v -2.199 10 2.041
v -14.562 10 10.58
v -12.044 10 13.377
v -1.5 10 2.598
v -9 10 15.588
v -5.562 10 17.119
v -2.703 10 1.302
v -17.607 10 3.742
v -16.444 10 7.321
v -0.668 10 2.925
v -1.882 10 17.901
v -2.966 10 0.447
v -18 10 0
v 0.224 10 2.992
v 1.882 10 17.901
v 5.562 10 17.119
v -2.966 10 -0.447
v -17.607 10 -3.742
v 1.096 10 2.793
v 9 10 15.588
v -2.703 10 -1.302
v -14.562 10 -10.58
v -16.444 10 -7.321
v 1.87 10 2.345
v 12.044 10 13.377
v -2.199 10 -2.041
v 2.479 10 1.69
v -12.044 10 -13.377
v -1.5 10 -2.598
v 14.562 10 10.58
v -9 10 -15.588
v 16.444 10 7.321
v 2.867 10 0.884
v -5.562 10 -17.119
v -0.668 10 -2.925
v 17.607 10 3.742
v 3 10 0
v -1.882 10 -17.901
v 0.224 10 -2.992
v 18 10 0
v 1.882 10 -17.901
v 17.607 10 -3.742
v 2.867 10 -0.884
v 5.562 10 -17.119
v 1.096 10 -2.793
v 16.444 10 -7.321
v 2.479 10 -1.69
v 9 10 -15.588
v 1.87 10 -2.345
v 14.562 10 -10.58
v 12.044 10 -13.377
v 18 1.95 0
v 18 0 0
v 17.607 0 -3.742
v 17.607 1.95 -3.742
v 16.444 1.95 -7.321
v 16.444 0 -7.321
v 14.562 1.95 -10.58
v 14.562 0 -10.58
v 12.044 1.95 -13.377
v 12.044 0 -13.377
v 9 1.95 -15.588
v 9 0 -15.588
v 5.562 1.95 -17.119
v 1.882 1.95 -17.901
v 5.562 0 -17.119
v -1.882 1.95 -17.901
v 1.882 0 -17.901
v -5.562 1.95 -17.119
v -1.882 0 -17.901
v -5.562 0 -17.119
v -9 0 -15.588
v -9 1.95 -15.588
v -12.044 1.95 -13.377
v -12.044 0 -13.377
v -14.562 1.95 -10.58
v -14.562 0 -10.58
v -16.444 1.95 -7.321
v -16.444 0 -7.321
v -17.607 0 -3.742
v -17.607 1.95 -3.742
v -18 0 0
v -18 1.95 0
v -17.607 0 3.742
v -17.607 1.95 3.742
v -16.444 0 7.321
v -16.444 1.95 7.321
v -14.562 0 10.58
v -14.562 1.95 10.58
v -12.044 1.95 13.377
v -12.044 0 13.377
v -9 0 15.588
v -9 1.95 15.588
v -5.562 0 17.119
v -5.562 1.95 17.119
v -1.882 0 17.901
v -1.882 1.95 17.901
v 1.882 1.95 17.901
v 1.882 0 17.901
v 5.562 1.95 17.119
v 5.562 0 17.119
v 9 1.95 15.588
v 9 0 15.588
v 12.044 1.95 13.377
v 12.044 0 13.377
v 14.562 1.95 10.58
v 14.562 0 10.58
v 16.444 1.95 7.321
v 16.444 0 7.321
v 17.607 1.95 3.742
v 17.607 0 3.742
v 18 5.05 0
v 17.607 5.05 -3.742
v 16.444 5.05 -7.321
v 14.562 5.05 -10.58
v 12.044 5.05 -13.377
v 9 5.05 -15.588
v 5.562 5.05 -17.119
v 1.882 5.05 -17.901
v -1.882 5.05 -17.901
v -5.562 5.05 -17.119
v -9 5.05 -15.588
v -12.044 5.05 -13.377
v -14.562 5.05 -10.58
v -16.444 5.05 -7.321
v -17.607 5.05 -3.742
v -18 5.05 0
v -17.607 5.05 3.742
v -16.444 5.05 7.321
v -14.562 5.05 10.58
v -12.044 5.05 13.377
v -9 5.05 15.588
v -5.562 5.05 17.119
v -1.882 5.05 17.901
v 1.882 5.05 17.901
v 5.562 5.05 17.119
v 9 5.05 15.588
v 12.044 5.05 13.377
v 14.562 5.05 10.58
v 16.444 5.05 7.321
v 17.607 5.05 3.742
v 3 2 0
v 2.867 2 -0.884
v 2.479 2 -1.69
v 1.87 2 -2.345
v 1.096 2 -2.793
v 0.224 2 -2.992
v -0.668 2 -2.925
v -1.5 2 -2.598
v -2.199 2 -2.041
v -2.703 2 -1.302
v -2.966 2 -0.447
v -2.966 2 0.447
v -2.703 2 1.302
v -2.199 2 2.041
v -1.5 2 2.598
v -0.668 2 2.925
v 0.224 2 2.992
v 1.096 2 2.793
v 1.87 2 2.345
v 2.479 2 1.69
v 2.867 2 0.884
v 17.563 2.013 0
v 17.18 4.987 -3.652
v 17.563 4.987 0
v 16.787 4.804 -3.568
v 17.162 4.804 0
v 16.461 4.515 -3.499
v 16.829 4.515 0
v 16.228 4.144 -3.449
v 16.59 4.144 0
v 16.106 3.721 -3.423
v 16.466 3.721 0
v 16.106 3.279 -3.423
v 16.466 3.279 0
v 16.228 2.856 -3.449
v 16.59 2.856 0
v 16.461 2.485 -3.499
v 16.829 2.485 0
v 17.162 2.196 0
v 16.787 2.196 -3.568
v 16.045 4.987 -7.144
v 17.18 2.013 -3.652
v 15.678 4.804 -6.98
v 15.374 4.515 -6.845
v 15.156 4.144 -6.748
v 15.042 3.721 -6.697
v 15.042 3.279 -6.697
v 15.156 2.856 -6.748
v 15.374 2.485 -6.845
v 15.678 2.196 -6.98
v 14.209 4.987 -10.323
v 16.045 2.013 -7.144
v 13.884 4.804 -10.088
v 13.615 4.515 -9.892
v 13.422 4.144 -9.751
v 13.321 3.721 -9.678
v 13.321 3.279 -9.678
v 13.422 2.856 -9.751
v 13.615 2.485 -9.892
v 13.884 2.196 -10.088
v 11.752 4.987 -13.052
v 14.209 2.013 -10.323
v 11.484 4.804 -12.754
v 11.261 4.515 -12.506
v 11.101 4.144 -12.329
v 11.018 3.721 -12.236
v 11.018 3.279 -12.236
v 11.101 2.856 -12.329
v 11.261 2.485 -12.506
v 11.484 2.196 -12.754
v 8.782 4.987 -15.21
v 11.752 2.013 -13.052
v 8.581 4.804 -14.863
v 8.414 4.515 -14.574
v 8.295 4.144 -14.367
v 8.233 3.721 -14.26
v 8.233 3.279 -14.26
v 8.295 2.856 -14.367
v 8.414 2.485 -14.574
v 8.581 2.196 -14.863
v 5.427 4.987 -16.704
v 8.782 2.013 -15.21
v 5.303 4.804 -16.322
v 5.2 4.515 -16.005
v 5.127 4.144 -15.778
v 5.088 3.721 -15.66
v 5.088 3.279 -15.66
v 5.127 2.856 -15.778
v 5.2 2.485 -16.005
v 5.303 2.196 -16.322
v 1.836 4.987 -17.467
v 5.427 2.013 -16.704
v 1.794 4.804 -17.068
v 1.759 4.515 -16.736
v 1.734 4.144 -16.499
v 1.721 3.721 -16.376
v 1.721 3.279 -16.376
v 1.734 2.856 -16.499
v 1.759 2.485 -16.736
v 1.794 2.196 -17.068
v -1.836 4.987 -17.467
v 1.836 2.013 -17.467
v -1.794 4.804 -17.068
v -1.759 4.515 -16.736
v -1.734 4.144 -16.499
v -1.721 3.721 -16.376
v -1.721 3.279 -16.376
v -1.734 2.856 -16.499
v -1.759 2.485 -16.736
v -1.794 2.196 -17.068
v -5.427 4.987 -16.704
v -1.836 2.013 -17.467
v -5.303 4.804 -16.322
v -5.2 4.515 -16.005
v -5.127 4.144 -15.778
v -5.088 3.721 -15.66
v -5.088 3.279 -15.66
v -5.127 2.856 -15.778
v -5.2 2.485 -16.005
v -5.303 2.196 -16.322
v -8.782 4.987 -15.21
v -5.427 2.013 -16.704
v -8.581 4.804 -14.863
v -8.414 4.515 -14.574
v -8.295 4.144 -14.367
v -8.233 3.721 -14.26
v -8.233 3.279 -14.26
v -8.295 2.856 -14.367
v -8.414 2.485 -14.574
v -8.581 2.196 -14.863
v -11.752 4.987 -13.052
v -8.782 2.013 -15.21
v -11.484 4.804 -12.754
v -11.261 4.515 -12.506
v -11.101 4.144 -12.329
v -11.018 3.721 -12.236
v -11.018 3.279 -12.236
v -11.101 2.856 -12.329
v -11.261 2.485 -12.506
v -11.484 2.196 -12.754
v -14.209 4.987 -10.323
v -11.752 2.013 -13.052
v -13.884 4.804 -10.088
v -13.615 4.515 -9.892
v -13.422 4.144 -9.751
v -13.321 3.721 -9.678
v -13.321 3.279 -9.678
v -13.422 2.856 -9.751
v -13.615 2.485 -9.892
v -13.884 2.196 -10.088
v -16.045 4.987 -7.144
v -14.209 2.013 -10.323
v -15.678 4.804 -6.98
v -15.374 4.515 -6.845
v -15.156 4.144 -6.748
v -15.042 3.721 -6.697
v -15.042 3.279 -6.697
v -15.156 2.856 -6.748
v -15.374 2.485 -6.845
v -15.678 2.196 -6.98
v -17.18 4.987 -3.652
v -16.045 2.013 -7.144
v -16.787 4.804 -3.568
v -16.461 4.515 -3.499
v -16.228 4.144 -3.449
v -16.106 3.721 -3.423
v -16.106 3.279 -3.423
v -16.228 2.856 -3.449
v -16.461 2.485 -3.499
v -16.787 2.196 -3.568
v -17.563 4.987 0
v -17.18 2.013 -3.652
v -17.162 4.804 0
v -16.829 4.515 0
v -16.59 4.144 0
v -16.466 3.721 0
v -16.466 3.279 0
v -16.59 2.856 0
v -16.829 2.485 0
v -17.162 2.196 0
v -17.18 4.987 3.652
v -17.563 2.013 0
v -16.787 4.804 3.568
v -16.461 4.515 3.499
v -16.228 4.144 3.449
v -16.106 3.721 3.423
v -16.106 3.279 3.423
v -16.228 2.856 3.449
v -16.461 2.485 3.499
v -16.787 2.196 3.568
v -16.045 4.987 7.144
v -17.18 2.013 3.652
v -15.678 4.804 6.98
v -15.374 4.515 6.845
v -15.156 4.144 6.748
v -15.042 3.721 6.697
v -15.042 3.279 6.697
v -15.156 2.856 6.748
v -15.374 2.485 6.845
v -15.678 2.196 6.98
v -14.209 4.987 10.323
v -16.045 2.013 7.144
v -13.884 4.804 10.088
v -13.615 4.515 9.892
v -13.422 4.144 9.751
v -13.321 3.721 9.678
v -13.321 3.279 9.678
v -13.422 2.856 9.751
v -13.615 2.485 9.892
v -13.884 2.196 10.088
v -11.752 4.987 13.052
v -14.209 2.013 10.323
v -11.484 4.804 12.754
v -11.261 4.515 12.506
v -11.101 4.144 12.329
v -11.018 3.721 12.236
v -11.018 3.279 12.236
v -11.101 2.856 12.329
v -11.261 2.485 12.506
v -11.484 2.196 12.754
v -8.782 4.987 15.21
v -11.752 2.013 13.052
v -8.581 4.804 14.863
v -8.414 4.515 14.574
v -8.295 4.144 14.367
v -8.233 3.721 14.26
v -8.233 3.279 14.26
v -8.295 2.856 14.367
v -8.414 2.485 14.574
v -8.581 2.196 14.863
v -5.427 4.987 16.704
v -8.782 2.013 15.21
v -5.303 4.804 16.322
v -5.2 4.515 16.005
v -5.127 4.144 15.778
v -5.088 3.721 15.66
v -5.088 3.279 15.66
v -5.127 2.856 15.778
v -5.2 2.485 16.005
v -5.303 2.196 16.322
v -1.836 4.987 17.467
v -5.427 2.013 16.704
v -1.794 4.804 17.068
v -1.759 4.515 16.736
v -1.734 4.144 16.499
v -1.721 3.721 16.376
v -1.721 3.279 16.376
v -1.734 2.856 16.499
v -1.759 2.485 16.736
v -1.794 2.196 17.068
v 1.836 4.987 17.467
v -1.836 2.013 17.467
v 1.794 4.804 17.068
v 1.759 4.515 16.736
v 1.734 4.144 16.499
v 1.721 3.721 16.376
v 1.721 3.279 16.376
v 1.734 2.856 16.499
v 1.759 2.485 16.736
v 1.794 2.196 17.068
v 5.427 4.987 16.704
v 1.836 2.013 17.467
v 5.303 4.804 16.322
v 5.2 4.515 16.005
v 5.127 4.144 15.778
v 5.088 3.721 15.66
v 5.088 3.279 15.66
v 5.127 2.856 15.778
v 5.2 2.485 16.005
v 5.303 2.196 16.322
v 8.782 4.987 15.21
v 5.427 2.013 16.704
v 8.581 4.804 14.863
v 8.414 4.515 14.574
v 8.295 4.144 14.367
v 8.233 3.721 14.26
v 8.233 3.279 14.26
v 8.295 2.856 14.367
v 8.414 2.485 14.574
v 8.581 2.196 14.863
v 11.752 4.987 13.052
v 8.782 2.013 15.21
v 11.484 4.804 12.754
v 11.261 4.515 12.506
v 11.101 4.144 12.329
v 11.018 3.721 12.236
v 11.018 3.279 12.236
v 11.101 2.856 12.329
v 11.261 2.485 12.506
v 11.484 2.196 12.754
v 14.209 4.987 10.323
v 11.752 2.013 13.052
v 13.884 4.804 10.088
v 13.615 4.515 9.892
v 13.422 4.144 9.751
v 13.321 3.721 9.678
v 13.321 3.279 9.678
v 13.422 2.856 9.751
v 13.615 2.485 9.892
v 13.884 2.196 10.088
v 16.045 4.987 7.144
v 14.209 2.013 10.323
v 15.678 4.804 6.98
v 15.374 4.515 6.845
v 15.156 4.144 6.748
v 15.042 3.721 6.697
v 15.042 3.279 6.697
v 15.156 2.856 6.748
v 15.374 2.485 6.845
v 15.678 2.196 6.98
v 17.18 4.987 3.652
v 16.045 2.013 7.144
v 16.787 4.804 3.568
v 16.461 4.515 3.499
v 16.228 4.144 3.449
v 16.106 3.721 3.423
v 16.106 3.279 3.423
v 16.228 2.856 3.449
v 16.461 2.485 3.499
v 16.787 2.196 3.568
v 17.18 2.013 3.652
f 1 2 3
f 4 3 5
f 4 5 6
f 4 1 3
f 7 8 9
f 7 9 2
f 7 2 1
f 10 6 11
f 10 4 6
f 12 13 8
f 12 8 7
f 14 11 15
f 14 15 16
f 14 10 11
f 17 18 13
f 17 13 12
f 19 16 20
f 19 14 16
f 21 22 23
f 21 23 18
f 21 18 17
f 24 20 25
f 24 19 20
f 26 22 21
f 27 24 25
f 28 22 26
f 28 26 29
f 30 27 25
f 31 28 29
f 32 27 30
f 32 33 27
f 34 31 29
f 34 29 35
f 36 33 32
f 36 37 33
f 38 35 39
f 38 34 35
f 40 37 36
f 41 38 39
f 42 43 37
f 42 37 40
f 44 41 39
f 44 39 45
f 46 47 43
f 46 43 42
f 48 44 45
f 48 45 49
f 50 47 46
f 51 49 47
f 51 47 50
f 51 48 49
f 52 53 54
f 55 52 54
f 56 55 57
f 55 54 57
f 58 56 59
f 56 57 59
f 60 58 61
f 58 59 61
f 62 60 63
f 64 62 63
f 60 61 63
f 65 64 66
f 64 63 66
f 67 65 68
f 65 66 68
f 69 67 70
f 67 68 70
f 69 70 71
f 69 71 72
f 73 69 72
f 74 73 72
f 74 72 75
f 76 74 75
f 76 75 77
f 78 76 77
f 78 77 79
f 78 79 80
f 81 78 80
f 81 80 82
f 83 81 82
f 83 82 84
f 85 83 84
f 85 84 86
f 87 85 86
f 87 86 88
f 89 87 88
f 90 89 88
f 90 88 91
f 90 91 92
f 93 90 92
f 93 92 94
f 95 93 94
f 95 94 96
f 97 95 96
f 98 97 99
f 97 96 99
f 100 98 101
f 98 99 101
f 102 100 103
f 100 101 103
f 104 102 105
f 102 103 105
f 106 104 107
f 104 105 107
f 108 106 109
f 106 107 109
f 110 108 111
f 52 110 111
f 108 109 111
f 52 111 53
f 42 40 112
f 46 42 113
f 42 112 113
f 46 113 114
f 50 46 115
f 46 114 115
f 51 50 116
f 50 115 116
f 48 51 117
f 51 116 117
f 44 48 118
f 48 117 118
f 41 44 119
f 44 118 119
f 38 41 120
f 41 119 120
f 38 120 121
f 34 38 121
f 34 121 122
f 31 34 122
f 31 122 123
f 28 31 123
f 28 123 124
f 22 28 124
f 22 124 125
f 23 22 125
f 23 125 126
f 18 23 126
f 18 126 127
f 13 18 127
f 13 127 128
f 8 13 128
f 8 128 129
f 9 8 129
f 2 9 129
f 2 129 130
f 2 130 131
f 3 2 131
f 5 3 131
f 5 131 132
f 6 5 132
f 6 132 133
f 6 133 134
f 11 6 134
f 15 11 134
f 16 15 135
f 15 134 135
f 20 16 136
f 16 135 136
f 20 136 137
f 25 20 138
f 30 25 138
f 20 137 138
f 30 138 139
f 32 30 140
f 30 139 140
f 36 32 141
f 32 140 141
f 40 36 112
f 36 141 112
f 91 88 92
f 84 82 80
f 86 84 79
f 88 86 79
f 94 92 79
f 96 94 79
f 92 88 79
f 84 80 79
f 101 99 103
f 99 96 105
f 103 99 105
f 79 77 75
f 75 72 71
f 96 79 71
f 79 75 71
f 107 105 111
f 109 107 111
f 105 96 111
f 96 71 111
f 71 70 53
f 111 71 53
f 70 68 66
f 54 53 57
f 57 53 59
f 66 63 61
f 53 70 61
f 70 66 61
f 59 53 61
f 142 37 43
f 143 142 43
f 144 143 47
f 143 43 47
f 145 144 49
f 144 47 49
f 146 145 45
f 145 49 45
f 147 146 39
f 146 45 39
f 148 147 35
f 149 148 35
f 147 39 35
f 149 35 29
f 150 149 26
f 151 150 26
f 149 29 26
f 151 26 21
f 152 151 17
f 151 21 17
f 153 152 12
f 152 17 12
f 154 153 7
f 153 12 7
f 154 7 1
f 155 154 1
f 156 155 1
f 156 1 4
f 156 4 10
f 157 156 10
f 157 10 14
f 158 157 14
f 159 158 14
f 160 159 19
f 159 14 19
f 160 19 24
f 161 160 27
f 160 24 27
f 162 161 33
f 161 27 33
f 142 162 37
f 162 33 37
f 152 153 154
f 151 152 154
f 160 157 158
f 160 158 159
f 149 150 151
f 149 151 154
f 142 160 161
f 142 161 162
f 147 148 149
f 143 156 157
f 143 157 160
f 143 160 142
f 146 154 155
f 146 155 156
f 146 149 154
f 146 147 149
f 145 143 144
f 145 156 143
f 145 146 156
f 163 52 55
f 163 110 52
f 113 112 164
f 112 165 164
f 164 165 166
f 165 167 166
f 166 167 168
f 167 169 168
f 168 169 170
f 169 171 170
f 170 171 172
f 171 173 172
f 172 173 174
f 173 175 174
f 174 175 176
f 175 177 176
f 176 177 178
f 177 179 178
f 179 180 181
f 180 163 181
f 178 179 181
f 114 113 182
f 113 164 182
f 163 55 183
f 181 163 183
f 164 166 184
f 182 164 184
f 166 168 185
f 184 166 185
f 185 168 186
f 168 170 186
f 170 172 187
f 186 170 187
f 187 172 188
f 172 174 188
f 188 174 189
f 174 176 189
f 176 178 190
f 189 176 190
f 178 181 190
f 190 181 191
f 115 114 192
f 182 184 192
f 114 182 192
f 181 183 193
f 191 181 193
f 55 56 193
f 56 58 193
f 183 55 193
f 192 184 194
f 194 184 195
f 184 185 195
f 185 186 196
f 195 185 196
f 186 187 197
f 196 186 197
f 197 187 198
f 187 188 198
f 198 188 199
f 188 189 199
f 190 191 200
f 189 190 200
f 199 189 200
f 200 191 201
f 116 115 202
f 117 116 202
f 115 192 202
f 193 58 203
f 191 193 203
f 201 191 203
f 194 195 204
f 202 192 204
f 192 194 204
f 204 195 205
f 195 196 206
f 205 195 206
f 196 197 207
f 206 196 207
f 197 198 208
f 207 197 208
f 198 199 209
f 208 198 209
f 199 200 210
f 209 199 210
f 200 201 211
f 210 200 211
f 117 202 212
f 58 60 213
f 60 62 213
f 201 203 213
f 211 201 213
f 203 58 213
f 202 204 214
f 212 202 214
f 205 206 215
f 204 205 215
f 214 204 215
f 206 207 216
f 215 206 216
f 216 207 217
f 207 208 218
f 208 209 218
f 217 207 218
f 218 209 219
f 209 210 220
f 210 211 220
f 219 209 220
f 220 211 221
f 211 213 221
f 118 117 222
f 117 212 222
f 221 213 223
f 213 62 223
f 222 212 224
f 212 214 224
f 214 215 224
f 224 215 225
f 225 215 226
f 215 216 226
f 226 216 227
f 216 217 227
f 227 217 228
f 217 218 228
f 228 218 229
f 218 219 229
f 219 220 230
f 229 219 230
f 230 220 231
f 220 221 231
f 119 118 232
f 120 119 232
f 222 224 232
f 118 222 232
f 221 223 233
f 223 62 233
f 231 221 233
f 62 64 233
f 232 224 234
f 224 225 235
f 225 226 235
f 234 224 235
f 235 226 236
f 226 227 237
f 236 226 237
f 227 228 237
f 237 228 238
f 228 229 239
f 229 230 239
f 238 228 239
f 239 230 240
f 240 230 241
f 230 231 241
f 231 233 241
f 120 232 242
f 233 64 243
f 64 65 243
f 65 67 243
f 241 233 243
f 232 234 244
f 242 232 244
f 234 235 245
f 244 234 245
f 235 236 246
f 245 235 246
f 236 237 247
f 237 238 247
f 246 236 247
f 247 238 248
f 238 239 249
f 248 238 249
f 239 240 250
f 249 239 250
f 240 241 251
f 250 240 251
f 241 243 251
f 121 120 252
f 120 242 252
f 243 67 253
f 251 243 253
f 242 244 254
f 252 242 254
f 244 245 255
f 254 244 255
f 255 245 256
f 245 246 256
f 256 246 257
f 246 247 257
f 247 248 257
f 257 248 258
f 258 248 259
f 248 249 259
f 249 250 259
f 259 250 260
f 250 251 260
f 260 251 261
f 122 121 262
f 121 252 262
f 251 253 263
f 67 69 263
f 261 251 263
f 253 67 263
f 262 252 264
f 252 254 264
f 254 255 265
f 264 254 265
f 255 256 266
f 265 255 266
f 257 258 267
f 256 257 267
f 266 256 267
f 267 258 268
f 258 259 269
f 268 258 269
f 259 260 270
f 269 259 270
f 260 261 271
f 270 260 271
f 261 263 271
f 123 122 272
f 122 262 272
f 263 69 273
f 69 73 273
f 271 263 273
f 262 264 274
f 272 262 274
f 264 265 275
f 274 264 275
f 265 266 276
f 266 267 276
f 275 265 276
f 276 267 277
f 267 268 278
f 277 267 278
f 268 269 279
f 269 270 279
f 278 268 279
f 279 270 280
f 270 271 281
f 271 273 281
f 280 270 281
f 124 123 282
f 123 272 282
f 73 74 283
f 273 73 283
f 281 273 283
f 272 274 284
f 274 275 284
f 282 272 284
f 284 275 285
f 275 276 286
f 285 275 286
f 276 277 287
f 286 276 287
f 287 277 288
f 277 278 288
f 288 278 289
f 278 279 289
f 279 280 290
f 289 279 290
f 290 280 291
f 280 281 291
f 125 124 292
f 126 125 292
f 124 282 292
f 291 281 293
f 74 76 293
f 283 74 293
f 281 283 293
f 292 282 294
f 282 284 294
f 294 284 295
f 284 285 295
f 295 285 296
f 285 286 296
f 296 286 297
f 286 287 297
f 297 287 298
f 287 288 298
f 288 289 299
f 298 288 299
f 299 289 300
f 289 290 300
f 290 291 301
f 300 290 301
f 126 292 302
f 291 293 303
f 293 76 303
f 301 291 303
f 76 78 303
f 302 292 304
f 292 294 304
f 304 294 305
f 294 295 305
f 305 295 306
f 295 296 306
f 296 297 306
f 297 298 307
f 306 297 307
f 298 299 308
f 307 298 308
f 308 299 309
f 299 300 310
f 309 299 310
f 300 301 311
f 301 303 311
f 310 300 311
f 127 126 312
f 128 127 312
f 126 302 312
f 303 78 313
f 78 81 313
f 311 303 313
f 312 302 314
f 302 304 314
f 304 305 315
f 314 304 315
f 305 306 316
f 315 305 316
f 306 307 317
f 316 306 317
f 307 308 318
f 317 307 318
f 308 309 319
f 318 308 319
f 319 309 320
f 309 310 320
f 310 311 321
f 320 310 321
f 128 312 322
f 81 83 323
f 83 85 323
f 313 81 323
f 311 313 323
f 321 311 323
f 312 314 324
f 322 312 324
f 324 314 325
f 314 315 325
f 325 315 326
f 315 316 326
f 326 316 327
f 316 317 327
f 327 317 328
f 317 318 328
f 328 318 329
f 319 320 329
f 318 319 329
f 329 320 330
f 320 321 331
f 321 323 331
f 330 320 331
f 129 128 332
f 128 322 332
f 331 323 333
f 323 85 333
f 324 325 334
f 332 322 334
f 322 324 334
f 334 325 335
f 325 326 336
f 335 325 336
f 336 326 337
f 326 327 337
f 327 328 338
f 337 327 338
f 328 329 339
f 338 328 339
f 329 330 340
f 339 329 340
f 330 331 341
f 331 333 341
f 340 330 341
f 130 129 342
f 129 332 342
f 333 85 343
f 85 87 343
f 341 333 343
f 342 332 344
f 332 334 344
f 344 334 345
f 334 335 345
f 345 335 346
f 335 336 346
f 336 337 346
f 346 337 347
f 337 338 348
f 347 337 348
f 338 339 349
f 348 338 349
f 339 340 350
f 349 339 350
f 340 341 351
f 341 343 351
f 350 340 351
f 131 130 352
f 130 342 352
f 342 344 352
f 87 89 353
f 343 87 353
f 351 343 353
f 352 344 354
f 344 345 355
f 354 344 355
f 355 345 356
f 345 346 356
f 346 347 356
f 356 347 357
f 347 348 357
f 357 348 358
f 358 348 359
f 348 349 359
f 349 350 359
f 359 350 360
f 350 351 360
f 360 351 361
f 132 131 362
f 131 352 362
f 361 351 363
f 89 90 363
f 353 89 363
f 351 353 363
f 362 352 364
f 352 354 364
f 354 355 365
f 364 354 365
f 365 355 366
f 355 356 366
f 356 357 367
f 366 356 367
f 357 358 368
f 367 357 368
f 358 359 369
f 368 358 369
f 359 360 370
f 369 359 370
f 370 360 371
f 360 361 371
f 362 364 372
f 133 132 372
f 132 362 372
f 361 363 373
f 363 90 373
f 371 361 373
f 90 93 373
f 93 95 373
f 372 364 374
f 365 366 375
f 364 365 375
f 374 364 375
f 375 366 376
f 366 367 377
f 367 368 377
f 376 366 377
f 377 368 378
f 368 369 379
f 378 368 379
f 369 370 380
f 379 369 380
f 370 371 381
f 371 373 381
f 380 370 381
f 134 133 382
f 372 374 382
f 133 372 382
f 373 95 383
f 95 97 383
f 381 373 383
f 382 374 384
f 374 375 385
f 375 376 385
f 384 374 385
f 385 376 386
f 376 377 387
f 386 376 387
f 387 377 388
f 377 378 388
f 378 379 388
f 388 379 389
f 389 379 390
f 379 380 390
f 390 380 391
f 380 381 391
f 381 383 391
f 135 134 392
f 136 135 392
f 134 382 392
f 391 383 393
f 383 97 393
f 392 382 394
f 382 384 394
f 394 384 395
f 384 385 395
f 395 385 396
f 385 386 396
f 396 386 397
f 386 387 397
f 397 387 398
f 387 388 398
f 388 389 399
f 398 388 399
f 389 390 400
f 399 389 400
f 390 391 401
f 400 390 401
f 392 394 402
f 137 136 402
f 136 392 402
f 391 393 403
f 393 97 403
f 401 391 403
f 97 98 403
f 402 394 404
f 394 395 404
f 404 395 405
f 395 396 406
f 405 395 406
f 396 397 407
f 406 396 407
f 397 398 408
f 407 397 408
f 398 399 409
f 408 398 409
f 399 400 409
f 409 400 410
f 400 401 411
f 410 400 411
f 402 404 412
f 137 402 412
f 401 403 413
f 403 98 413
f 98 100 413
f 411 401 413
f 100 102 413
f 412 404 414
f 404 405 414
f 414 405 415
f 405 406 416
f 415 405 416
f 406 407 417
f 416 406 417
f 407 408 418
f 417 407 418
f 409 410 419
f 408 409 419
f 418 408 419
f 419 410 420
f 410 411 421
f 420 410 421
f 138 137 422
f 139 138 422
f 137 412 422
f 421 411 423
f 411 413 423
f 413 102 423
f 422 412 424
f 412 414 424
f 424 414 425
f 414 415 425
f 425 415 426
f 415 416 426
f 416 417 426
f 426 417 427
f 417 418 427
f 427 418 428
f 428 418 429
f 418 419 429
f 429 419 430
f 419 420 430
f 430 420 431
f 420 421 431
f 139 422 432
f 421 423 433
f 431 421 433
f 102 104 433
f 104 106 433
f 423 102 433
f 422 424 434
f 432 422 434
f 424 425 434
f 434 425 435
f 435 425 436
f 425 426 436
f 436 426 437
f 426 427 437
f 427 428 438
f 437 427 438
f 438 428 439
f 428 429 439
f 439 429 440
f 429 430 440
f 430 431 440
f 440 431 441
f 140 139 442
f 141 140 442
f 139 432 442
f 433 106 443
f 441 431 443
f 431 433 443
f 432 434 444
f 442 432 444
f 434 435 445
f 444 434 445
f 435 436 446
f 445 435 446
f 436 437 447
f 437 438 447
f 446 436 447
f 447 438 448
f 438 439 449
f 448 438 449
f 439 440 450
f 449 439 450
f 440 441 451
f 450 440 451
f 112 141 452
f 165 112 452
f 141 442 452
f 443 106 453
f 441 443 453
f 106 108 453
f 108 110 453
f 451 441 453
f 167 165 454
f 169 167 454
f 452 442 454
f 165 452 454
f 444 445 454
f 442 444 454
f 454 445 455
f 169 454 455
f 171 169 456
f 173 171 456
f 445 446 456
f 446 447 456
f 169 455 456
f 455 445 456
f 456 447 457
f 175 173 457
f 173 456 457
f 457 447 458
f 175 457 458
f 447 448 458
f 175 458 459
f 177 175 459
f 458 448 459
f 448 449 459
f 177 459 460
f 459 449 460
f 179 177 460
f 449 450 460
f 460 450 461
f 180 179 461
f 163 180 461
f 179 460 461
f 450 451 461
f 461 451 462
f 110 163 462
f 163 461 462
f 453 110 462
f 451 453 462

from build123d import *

# Parameters (mm, degrees)
SKETCH1_R           = 18
BOSS_EXTRUDE1_DEPTH = 10
SKETCH2_R           = 1.55
SKETCH4_R           = 3
CUT_EXTRUDE1_DEPTH  = 8


with BuildPart() as part:
    # Sketch1 → Boss-Extrude1 (new body)
    with BuildSketch(Plane(origin=(0, 0, 0), x_dir=(1, 0, 0), z_dir=(0, 1, 0))):
        Circle(SKETCH1_R)
    extrude(amount=BOSS_EXTRUDE1_DEPTH)

    # Sketch2 → Cut-Revolve1 (revolve, cut)
    with BuildSketch(Plane.XY):
        with Locations((18, 3.5)):
            Circle(SKETCH2_R)
    revolve(axis=Axis((0, 0, 0), (0, 1, 0)), mode=Mode.SUBTRACT)

    # Sketch4 → Cut-Extrude1 (cut)
    with BuildSketch(Plane(origin=(0, 10, 0), x_dir=(1, 0, 0), z_dir=(0, 1, 0))):
        Circle(SKETCH4_R)
    extrude(amount=-CUT_EXTRUDE1_DEPTH, mode=Mode.SUBTRACT)


solid = part.part
